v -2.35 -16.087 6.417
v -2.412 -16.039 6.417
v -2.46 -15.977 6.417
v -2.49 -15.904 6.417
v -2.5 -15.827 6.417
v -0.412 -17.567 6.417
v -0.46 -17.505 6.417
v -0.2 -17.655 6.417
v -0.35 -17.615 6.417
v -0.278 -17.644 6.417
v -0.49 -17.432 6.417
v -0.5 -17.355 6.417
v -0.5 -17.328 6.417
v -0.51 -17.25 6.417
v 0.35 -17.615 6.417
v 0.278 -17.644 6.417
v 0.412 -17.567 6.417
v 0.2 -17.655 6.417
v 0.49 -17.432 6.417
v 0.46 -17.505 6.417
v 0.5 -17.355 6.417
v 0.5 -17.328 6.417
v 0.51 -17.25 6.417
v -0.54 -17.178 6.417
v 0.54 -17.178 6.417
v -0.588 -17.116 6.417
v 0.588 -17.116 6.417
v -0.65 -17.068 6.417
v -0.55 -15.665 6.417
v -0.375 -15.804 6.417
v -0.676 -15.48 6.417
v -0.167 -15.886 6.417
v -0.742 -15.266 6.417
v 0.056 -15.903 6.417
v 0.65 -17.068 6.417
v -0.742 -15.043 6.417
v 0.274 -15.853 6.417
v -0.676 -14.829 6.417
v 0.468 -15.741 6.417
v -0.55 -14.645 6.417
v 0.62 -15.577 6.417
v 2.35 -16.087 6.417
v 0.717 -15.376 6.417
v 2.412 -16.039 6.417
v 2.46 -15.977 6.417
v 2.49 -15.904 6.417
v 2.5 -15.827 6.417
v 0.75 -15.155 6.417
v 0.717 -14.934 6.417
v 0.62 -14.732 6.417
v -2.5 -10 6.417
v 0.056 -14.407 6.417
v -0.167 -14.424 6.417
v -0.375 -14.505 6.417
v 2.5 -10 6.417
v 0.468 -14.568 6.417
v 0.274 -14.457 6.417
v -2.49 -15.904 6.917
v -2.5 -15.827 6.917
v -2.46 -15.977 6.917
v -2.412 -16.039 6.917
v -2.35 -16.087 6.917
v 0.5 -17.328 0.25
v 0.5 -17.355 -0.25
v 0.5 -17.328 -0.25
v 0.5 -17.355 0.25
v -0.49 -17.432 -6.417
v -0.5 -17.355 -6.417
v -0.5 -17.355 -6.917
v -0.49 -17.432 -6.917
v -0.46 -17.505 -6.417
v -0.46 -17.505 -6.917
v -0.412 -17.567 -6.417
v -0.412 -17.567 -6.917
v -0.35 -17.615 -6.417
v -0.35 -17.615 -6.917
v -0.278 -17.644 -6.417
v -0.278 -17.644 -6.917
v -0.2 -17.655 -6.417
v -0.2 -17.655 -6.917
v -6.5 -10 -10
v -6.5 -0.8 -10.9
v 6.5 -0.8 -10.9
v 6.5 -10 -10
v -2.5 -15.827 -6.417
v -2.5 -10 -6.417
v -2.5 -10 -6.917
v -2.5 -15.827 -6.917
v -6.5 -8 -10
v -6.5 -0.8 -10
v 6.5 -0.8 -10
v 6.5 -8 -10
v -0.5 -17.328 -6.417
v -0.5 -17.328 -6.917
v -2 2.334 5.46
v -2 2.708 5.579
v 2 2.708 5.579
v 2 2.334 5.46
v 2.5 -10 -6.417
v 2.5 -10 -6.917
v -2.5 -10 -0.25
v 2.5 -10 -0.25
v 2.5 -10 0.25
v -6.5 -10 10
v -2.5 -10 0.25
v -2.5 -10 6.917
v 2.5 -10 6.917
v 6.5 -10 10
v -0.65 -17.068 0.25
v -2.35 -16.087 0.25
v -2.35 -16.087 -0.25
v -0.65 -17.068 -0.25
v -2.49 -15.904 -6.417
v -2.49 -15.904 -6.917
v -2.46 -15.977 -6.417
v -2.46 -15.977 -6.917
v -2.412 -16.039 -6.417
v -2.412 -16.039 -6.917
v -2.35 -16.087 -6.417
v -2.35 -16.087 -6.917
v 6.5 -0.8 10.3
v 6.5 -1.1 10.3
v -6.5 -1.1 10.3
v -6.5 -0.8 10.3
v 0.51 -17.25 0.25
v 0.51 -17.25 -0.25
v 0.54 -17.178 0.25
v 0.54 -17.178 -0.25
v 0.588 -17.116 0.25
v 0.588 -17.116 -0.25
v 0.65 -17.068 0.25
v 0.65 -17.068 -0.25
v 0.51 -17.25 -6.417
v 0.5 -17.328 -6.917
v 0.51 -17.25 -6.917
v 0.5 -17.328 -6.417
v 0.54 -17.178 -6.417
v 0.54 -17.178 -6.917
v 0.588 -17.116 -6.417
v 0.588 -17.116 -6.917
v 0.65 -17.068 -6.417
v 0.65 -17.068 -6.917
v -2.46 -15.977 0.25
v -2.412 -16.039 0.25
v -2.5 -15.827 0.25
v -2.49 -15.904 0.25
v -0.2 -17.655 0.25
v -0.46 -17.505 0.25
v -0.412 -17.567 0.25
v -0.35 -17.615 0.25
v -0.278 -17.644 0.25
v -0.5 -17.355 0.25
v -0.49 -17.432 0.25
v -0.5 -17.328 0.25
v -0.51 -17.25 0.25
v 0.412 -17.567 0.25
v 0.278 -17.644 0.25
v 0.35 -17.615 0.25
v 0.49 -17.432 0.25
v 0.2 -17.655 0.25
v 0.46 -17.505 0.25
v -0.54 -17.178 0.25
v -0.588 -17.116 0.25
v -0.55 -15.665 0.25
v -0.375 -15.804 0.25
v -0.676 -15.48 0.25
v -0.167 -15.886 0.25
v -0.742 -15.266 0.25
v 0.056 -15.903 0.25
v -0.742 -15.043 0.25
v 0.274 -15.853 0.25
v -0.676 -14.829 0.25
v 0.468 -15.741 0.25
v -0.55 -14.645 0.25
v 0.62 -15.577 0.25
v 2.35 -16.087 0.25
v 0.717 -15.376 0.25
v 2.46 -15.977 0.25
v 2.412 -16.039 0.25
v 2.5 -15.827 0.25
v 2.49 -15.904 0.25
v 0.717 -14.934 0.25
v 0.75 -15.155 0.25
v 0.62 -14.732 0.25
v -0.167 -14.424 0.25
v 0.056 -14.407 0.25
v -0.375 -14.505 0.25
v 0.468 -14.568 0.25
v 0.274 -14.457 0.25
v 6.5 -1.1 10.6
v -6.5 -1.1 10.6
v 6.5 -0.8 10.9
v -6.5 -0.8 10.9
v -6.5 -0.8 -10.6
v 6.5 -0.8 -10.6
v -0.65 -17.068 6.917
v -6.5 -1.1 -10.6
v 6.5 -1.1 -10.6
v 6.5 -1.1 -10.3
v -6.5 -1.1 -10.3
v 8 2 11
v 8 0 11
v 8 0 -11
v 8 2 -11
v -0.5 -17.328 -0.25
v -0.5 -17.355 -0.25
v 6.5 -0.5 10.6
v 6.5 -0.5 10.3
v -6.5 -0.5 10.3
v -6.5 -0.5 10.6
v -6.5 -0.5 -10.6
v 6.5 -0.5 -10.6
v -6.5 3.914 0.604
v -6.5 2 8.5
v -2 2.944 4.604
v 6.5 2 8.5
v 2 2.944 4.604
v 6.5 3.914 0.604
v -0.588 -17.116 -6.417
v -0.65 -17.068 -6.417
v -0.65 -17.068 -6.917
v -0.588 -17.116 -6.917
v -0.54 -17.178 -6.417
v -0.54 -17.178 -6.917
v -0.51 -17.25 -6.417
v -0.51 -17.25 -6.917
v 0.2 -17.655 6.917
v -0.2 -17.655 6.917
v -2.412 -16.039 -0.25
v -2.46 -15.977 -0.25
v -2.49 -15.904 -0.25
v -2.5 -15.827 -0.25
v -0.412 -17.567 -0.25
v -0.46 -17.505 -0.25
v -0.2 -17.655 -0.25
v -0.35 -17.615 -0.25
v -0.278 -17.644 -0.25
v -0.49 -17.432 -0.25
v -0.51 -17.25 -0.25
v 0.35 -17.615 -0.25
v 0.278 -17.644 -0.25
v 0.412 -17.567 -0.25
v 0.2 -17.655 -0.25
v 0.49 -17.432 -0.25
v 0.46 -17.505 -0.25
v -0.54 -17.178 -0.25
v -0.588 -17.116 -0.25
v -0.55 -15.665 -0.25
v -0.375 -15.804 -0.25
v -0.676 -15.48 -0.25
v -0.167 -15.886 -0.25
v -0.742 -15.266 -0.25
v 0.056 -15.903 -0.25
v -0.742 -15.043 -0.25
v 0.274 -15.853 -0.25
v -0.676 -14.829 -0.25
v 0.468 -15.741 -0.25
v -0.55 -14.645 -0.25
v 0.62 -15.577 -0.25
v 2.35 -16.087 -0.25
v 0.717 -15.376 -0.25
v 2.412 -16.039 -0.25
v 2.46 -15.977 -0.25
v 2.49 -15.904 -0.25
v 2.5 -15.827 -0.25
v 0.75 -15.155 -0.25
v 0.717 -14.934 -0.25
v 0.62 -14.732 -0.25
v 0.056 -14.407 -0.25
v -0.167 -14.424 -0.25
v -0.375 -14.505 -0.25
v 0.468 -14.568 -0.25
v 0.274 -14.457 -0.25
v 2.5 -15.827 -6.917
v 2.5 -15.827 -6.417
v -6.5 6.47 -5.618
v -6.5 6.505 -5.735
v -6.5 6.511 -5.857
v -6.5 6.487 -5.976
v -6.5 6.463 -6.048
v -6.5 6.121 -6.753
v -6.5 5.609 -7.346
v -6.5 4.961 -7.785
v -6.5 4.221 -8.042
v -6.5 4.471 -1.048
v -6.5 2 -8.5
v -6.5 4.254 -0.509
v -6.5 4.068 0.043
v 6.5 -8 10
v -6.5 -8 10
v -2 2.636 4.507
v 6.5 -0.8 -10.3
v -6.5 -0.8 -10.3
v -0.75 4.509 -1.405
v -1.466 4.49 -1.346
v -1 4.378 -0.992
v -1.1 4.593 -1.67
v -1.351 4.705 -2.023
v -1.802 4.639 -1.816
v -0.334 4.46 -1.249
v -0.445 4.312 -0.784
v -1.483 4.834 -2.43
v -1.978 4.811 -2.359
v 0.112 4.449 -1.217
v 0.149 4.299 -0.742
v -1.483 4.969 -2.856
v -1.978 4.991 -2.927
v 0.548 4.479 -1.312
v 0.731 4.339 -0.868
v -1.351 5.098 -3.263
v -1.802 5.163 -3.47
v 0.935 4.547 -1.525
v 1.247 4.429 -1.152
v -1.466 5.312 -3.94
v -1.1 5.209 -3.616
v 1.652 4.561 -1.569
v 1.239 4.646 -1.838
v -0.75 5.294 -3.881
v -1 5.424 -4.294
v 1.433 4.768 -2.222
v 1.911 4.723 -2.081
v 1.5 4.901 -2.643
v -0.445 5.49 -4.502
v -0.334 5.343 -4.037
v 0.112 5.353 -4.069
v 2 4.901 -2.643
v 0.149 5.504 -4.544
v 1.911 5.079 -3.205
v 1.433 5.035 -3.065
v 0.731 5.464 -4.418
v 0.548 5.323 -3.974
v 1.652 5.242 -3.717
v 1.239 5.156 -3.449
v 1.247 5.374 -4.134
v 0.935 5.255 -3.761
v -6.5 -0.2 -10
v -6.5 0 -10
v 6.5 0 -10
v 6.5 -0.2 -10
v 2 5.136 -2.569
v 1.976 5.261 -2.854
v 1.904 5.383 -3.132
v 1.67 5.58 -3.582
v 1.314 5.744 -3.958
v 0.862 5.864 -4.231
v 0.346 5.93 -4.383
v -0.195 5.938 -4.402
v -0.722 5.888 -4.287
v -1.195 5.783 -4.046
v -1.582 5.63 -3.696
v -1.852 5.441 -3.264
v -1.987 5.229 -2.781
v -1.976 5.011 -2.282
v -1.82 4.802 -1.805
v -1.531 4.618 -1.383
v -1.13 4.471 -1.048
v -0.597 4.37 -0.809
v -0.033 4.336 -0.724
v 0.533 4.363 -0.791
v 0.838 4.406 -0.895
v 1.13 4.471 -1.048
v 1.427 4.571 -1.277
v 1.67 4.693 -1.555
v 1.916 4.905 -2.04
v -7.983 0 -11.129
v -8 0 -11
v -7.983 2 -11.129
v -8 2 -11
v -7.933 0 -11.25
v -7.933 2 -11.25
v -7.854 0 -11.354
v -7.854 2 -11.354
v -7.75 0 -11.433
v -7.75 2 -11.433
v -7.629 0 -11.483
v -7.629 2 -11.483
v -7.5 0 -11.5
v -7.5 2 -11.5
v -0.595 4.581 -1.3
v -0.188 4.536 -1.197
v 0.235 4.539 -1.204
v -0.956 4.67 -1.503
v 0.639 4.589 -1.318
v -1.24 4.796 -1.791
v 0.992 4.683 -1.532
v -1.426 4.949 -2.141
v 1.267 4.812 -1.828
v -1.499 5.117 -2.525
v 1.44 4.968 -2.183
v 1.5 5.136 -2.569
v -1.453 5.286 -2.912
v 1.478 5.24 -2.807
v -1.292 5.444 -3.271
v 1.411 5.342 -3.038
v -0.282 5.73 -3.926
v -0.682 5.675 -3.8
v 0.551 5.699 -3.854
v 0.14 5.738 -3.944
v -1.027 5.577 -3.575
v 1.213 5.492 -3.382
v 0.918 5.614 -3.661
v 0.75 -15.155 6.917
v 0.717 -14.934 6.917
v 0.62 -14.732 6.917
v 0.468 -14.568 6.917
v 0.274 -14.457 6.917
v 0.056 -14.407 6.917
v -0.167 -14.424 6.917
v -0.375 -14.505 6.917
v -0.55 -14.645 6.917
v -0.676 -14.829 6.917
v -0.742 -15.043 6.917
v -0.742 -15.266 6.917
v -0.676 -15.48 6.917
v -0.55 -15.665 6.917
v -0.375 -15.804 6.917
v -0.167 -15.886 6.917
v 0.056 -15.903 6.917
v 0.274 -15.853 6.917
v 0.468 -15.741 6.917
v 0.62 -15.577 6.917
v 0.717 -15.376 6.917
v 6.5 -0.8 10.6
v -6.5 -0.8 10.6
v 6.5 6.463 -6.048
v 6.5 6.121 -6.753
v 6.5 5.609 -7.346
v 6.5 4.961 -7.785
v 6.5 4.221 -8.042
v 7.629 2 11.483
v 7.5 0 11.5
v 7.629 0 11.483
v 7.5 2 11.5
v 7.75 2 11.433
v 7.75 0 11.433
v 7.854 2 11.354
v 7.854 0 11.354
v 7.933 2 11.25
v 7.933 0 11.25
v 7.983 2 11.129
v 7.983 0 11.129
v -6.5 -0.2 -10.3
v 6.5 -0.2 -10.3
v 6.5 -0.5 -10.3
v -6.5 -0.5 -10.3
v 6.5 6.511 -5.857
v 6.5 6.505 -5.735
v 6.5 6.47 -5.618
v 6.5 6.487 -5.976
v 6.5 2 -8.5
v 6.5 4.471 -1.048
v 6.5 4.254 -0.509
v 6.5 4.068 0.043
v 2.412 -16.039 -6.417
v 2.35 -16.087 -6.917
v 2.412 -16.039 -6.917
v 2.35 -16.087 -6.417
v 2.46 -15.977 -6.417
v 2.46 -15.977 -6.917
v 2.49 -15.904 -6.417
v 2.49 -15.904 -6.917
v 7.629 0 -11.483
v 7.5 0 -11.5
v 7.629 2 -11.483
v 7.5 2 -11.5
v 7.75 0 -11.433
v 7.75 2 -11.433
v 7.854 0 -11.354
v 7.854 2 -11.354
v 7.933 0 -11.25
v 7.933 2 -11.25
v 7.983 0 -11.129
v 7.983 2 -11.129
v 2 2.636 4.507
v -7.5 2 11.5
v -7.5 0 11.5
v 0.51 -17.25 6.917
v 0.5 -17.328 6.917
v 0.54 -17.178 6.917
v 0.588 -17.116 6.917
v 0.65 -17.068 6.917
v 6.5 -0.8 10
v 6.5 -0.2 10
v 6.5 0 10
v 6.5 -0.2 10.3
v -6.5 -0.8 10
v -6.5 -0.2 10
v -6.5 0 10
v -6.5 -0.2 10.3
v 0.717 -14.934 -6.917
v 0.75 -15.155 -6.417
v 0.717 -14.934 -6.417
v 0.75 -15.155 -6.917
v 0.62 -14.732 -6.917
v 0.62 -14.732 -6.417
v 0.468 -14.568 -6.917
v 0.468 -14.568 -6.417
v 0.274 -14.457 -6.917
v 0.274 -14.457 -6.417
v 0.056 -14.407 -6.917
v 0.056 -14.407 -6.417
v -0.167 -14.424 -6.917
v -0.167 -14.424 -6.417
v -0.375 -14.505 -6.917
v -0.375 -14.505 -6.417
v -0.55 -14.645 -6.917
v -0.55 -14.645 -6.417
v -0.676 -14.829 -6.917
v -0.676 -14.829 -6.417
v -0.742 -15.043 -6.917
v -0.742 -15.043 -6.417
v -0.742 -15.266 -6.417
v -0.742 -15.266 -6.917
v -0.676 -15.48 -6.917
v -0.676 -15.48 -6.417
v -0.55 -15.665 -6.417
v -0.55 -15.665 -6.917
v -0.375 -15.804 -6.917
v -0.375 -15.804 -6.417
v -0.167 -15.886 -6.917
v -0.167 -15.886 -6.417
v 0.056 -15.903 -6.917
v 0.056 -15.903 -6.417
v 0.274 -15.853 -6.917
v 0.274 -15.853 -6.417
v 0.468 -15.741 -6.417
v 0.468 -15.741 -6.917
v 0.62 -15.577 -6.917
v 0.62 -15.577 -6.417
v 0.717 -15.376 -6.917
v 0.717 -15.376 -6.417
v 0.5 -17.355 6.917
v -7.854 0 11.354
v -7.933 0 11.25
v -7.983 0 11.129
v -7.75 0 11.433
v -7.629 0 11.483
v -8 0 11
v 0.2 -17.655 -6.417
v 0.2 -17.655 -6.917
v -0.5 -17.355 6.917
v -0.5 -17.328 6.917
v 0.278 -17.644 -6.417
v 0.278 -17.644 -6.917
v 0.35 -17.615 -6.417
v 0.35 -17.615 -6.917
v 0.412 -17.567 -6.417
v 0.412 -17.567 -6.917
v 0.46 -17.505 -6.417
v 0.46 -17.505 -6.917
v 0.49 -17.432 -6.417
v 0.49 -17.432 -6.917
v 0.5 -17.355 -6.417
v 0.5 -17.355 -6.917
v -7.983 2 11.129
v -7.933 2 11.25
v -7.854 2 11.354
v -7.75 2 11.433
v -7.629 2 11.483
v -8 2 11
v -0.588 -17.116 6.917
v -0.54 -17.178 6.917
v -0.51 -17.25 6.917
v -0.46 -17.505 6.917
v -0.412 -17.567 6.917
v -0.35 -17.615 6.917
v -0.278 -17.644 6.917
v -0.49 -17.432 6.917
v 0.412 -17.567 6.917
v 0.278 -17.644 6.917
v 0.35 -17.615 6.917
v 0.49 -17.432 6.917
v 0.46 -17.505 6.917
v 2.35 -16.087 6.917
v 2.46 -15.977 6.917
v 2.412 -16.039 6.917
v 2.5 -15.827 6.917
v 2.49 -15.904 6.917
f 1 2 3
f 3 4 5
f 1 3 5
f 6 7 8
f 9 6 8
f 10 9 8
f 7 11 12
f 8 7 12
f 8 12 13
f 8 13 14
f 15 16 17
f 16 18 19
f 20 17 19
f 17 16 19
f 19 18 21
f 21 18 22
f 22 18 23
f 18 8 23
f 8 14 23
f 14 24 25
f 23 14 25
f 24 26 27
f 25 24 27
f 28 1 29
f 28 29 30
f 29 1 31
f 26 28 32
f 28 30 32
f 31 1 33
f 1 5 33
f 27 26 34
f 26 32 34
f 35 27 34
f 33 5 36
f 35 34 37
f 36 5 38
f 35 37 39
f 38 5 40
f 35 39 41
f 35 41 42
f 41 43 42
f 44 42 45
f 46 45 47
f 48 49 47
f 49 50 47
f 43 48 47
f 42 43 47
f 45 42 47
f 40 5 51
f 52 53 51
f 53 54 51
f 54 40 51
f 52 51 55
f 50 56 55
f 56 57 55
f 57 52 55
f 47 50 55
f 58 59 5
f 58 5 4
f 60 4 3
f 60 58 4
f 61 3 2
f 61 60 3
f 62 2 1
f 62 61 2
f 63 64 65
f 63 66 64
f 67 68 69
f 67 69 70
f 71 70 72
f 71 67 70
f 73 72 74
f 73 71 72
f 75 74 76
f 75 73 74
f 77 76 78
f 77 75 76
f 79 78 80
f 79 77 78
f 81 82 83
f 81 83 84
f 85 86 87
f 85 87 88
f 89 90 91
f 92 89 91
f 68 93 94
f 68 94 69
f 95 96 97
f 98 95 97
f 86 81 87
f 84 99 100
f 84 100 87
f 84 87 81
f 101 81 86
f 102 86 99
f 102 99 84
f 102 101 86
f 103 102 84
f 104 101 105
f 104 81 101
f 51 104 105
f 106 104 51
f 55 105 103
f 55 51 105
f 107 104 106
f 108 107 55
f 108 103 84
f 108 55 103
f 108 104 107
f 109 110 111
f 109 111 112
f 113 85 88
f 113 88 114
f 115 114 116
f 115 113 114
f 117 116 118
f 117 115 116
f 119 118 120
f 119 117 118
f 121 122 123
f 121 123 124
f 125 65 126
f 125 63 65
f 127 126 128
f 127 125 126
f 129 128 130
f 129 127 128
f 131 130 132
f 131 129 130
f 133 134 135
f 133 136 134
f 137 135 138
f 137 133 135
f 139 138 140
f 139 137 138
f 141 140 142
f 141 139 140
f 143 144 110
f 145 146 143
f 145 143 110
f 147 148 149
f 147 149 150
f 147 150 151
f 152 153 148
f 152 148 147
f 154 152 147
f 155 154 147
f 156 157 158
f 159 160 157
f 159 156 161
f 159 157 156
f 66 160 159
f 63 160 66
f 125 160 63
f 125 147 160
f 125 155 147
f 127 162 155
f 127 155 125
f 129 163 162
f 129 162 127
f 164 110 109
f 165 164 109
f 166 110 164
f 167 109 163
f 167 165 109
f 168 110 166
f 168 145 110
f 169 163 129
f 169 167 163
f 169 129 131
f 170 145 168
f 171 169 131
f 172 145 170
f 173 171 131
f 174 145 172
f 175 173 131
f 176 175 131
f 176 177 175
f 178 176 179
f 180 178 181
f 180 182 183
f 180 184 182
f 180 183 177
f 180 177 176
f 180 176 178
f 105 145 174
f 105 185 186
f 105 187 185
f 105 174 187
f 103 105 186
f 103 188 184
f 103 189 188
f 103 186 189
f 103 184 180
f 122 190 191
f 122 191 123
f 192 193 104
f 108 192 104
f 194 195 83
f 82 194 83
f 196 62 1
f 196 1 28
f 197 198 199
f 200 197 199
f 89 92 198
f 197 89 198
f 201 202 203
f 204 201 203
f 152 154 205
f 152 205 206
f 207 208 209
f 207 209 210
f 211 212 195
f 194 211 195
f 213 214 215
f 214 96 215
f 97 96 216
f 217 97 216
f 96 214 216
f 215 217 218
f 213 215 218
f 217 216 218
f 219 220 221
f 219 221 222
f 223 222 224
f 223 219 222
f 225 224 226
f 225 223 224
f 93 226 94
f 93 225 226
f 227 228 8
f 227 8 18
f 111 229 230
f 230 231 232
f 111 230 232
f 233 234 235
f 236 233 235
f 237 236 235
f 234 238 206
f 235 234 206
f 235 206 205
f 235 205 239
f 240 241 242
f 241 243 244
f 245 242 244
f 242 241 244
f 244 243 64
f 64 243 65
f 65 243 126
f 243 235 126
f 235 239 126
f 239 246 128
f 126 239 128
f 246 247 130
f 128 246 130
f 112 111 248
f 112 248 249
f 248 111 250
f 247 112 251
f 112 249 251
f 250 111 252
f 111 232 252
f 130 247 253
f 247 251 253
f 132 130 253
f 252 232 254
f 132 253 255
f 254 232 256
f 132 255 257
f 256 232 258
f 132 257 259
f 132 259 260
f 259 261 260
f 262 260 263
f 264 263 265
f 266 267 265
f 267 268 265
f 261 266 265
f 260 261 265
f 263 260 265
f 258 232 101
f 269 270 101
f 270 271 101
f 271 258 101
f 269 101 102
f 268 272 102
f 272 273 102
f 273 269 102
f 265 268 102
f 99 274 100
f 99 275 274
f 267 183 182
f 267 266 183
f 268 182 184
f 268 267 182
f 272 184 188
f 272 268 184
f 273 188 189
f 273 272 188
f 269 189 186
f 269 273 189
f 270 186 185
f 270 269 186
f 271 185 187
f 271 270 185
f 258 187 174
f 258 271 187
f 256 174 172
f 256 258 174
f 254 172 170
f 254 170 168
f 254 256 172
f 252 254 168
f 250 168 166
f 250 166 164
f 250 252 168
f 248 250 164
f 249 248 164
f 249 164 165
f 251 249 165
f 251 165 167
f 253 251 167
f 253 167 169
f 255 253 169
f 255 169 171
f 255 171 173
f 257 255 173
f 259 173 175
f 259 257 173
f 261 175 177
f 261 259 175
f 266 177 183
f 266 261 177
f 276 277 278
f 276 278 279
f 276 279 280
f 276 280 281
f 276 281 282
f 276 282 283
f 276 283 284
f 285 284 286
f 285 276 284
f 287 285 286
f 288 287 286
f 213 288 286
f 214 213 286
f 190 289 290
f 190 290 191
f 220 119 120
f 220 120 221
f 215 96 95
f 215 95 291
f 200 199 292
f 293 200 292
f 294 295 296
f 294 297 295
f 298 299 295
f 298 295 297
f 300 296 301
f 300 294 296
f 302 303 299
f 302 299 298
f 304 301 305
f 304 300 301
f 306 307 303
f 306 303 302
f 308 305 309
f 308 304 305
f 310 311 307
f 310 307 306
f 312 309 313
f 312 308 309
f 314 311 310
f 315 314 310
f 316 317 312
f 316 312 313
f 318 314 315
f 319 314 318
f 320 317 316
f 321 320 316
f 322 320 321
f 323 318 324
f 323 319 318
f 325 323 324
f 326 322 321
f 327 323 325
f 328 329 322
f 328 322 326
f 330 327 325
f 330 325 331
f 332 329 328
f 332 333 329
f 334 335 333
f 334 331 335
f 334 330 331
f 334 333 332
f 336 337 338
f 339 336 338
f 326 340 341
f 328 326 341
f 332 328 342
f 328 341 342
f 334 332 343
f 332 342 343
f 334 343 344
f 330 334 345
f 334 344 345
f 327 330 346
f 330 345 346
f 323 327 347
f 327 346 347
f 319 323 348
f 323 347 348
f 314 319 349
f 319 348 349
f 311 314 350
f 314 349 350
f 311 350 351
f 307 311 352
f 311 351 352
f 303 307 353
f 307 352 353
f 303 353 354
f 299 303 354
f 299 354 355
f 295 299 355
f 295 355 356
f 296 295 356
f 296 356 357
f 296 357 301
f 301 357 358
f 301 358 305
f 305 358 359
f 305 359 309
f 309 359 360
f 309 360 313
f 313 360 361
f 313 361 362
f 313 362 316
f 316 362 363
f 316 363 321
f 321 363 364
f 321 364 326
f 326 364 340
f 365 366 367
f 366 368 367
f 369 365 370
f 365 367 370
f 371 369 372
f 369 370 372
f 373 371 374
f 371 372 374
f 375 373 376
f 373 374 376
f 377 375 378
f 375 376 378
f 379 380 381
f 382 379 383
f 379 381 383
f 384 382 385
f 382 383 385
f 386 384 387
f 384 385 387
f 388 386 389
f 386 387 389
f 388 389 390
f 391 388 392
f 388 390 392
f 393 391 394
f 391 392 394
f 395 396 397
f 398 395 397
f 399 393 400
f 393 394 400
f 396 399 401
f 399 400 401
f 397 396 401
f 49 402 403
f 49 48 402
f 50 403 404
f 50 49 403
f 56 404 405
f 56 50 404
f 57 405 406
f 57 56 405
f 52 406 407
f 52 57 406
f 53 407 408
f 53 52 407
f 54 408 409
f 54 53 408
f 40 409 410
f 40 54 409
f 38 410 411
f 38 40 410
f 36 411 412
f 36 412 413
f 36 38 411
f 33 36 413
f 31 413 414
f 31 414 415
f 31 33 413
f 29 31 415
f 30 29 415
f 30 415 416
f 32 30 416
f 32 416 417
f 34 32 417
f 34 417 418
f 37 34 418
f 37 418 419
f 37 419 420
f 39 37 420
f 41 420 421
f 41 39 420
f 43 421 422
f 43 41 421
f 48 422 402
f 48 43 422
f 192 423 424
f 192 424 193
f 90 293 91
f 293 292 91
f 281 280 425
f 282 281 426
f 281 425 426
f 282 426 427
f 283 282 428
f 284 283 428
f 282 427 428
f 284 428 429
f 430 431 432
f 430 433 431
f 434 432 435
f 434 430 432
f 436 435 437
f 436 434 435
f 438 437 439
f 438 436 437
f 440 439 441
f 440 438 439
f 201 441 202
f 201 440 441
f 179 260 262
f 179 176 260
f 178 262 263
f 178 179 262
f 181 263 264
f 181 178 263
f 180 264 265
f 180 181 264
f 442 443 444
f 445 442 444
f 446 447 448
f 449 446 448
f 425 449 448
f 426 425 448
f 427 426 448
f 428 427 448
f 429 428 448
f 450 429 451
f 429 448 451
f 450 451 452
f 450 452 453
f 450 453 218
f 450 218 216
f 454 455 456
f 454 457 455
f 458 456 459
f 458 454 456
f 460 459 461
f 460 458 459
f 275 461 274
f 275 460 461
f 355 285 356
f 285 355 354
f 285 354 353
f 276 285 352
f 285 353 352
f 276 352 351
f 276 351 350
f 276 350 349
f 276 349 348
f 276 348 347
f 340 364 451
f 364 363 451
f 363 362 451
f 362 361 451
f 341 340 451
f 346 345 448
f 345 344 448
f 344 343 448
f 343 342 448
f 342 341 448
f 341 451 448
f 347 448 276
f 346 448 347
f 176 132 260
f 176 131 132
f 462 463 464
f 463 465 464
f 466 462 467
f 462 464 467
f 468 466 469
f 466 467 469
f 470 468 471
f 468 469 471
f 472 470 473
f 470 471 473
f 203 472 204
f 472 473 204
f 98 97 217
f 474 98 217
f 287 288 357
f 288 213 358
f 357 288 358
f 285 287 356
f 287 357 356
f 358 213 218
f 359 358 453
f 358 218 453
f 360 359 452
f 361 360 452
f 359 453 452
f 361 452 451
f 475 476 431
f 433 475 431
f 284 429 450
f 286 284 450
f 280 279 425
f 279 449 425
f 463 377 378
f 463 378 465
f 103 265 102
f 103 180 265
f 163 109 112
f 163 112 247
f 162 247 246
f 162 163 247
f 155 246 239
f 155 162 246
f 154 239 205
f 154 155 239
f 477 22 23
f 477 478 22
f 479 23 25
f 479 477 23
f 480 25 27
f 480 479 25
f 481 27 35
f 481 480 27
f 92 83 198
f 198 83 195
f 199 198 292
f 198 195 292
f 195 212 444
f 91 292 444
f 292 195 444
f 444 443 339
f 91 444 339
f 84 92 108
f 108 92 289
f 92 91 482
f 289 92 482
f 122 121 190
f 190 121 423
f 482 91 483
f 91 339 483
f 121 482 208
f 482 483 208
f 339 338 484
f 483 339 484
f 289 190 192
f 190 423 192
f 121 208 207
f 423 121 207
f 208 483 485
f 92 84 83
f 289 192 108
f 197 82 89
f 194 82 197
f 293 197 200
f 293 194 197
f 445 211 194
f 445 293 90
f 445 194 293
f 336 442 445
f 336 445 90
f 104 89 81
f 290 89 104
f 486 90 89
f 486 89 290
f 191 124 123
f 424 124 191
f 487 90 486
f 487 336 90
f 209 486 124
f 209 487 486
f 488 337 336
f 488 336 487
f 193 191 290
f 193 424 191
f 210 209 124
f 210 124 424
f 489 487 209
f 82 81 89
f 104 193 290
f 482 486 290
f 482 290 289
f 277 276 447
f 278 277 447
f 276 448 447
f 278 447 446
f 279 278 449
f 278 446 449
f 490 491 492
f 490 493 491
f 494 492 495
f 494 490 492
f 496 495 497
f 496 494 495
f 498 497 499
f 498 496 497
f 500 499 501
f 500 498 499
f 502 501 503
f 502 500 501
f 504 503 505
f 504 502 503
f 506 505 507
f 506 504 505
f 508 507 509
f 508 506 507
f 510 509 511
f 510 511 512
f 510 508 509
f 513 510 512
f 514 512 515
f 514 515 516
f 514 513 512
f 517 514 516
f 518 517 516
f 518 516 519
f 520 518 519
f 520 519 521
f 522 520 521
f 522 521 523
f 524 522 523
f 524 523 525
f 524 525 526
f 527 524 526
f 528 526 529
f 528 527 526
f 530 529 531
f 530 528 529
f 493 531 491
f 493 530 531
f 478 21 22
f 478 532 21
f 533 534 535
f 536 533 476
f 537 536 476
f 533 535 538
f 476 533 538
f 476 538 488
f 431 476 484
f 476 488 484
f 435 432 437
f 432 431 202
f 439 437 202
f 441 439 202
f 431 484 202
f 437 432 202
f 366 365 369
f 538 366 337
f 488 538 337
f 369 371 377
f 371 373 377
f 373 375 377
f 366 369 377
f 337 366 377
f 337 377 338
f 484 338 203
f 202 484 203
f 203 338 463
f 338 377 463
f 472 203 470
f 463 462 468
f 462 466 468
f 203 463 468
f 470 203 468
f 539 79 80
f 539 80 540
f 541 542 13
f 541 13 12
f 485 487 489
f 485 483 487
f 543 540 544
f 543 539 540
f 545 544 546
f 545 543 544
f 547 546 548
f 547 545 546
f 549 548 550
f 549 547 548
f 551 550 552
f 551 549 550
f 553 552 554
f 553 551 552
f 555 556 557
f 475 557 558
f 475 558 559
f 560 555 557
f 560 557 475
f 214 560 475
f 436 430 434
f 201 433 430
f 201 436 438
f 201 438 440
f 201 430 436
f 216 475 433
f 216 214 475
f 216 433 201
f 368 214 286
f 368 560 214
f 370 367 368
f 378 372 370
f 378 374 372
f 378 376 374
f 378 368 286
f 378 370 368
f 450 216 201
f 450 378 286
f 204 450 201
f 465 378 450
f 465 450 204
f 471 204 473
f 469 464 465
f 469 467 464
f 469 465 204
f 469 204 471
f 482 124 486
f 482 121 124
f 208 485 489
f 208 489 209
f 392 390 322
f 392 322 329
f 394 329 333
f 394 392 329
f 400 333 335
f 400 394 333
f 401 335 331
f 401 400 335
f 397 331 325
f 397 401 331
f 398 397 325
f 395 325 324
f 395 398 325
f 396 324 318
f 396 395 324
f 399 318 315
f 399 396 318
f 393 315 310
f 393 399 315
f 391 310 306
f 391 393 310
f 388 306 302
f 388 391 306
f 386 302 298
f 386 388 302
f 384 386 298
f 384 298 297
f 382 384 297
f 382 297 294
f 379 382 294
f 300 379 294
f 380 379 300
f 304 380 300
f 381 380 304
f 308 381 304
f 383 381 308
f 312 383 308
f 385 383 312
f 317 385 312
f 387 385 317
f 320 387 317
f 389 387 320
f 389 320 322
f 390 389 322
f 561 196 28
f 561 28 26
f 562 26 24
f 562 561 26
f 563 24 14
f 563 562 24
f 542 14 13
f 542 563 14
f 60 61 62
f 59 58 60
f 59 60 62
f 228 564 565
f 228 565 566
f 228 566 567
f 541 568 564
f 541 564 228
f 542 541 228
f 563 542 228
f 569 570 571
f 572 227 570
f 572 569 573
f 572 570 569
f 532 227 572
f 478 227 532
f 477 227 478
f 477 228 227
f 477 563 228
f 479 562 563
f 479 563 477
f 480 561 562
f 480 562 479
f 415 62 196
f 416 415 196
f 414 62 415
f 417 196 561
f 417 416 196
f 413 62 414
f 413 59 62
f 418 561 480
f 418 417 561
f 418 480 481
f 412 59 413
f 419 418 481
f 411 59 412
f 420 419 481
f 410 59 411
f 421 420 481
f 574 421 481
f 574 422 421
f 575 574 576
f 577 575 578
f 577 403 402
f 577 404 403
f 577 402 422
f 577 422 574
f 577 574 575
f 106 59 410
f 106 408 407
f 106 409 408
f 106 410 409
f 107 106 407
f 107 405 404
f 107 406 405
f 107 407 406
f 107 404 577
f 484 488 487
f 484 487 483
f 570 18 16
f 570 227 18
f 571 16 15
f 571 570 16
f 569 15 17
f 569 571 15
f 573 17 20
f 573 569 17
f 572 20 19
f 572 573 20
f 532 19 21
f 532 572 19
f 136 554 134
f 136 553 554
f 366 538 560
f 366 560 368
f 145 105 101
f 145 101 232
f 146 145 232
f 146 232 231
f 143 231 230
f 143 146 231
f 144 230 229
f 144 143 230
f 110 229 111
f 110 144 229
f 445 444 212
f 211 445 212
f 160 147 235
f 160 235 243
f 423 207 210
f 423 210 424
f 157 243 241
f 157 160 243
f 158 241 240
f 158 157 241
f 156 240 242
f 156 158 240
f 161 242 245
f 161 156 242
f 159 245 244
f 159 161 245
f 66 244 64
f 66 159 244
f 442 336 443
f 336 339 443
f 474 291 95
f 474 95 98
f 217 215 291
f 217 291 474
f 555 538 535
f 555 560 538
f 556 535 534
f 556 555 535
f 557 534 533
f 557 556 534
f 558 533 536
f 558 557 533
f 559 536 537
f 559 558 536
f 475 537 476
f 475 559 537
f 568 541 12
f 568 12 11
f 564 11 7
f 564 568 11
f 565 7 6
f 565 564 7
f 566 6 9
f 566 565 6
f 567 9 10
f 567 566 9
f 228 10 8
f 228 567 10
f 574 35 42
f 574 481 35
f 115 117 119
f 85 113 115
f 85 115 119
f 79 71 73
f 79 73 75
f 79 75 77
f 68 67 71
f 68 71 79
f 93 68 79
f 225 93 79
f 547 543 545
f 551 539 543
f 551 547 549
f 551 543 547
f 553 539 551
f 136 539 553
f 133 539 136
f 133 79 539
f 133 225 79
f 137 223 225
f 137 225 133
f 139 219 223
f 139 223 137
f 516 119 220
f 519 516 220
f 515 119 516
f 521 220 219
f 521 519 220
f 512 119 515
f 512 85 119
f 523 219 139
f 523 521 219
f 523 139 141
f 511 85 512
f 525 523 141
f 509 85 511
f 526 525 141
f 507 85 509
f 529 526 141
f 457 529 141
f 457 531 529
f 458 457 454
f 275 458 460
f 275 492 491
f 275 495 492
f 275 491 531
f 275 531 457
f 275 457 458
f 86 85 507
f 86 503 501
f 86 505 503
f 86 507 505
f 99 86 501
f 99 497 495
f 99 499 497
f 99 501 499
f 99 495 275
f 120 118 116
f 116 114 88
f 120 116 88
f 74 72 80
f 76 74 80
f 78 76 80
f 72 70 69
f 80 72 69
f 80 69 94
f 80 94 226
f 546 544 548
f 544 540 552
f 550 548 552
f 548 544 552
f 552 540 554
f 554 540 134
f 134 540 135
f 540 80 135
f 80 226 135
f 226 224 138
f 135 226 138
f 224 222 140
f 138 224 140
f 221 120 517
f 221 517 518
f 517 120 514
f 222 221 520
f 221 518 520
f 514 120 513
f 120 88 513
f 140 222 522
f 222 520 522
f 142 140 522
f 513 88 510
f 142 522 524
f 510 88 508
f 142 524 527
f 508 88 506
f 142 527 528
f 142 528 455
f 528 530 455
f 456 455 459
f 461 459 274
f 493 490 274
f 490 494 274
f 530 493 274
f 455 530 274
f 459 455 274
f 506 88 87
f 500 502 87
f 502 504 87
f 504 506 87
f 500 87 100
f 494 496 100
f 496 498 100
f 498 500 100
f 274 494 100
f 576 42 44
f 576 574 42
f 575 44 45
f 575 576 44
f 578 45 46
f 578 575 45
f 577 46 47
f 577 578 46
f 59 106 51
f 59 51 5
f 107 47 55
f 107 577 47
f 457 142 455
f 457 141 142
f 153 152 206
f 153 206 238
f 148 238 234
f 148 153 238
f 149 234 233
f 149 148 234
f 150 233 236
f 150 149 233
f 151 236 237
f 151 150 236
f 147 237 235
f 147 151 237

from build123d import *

# Parameters (mm, degrees)
CROQUIS1_W              = 16
CROQUIS1_H              = 23
SALIENTE_EXTRUIR1_DEPTH = 2
CROQUIS2_W              = 13
CROQUIS2_H              = 20
SALIENTE_EXTRUIR2_DEPTH = 10
SALIENTE_EXTRUIR3_DEPTH = 6.5
CROQUIS4_R              = 2
CROQUIS4_R_2            = 1.5
CROQUIS4_W              = 4
CROQUIS4_H              = 1
CORTAR_EXTRUIR1_DEPTH   = 0.6
SALIENTE_EXTRUIR6_DEPTH = 6.5
REDONDEO1_R             = 0.5
CROQUIS6_R              = 0.75
SALIENTE_EXTRUIR7_DEPTH = 0.25
MATRIZL1_COUNT          = 2
MATRIZL1_PITCH          = 6.666666667
MATRIZL2_COUNT          = 2
MATRIZL2_PITCH          = 6.666666667


with BuildPart() as part:
    # Croquis1 → Saliente-Extruir1 (new body)
    with BuildSketch(Plane(origin=(0, 0, 0), x_dir=(1, 0, 0), z_dir=(0, 1, 0))):
        Rectangle(CROQUIS1_W, CROQUIS1_H)
    extrude(amount=SALIENTE_EXTRUIR1_DEPTH)

    # Croquis2 → Saliente-Extruir2 (add)
    with BuildSketch(Plane.XZ):
        Rectangle(CROQUIS2_W, CROQUIS2_H)
    extrude(amount=SALIENTE_EXTRUIR2_DEPTH)

    # Croquis3 → Saliente-Extruir3 (add, symmetric)
    with BuildSketch(Plane(origin=(0, 0, 0), x_dir=(0, 0, -1), z_dir=(1, 0, 0))):
        with BuildLine():
            Line((8.5, 2), (-8.5, 2))
            Line((-8.5, 2), (-0.603629693, 3.914367561))
            ThreePointArc((-0.603629693, 3.914367561), (0.234425411, 4.156697965), (1.048170976, 4.471147542))
            Line((1.048170976, 4.471147542), (5.618369194, 6.470445319))
            ThreePointArc((5.618369194, 6.470445319), (5.795753126, 6.511830798), (5.976190969, 6.486930957))
            Line((5.976190969, 6.486930957), (6.048439126, 6.462964543))
            ThreePointArc((6.048439126, 6.462964543), (7.345603515, 5.609203874), (8.042100494, 4.221243251))
            Line((8.042100494, 4.221243251), (8.5, 2))
        make_face()
    extrude(amount=SALIENTE_EXTRUIR3_DEPTH, both=True)

    # Croquis4 → Cortar-Extruir1 (cut)
    with BuildSketch(Plane(origin=(0, 4.265025315, 1.351360717), x_dir=(1, 0, 0), z_dir=(0, 0.95329272, 0.302047992))):
        with Locations((0, 4)):
            Circle(CROQUIS4_R)
        with Locations((0, 4)):
            Circle(CROQUIS4_R_2, mode=Mode.SUBTRACT)
        with Locations((0, -4)):
            Rectangle(CROQUIS4_W, CROQUIS4_H)
    extrude(amount=-CORTAR_EXTRUIR1_DEPTH, mode=Mode.SUBTRACT)

    # Croquis5 → Saliente-Extruir6 (add, symmetric)
    with BuildSketch(Plane(origin=(0, 0, 0), x_dir=(0, 0, -1), z_dir=(1, 0, 0))):
        Polygon((-10, -0.2), (-10.3, -0.2), (-10.3, -0.5), (-10.6, -0.5), (-10.6, -0.8), (-10.9, -0.8), (-10, -10), (-10, -8), (-10.6, -1.1), (-10.3, -1.1), (-10.3, -0.8), (-10, -0.8), align=None)
    saliente_extruir6 = extrude(amount=SALIENTE_EXTRUIR6_DEPTH, both=True)

    # Simetría2: Saliente-Extruir6 across plane
    add(saliente_extruir6.mirror(Plane.XY))

    # Redondeo1
    redondeo1_edges = [part.edges().sort_by_distance(p)[0] for p in [
        (-8, 1, -11.5),
        (8, 1, -11.5),
        (8, 1, 11.5),
        (-8, 1, 11.5),
    ]]
    fillet(redondeo1_edges, radius=REDONDEO1_R)

    # Croquis6 → Saliente-Extruir7 (add, symmetric)
    with BuildSketch(Plane.XY):
        with BuildLine():
            Line((2.5, -10), (-2.5, -10))
            Line((-2.5, -10), (-2.5, -15.826794919))
            ThreePointArc((-2.5, -15.826794919), (-2.459807621, -15.976794919), (-2.35, -16.08660254))
            Line((-2.35, -16.08660254), (-0.65, -17.068097998))
            ThreePointArc((-0.65, -17.068097998), (-0.540192379, -17.177905619), (-0.5, -17.327905619))
            Line((-0.5, -17.327905619), (-0.5, -17.354700538))
            ThreePointArc((-0.5, -17.354700538), (-0.412132034, -17.566832573), (-0.2, -17.654700538))
            Line((-0.2, -17.654700538), (0.2, -17.654700538))
            ThreePointArc((0.2, -17.654700538), (0.412132034, -17.566832573), (0.5, -17.354700538))
            Line((0.5, -17.354700538), (0.5, -17.327905619))
            ThreePointArc((0.5, -17.327905619), (0.540192379, -17.177905619), (0.65, -17.068097998))
            Line((0.65, -17.068097998), (2.35, -16.08660254))
            ThreePointArc((2.35, -16.08660254), (2.459807621, -15.976794919), (2.5, -15.826794919))
            Line((2.5, -15.826794919), (2.5, -10))
        make_face()
        with Locations((0, -15.154700538)):
            Circle(CROQUIS6_R, mode=Mode.SUBTRACT)
    saliente_extruir7 = extrude(amount=SALIENTE_EXTRUIR7_DEPTH, both=True)

    # MatrizL1: Saliente-Extruir7 ×2
    with Locations(*[(0, 0, -i * MATRIZL1_PITCH) for i in range(1, MATRIZL1_COUNT)]):
        add(saliente_extruir7)

    # MatrizL2: Saliente-Extruir7 ×2
    with Locations(*[(0, 0, i * MATRIZL2_PITCH) for i in range(1, MATRIZL2_COUNT)]):
        add(saliente_extruir7)


solid = part.part
